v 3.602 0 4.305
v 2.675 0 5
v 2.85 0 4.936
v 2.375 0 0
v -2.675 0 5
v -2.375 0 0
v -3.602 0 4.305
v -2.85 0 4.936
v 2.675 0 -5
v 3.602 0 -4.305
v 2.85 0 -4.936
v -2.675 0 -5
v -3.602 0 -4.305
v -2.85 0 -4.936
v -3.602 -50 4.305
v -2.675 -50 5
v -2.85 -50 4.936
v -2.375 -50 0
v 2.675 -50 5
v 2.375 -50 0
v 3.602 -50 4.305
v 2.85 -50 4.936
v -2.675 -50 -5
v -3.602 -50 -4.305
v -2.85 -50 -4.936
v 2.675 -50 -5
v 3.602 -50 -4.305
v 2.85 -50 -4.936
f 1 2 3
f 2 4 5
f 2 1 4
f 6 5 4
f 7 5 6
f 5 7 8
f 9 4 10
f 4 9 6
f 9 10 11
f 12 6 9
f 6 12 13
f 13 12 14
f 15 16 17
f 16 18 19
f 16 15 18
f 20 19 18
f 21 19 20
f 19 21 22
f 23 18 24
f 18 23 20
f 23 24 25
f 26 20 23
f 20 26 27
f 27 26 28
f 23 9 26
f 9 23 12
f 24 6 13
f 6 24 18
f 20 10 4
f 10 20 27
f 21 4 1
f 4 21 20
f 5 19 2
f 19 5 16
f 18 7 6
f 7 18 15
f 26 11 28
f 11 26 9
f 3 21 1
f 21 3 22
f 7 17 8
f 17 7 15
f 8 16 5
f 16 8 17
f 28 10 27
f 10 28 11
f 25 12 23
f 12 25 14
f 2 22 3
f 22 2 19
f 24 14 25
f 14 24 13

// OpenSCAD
// file: ../../globals.scad
/*
Most things in this file is represented as one millimeter, so keep that in mind while changing things.
Some of the setting are not mm but at variables that you can set, such as 2*x=2x and you are setting what x is.
I will try to specify when things are variables and not exact measurements.
*/

//Virindi settings
dovetail_male_width_scale = 0.98;
dovetail_male_height_scale = 0.91;

obj_leg = 30;
leg_length = 5.5;
small_number = 0.001;
metal_core_rode_global = 5;


///////////////// number of holes /////////////////////
z_hole_number = 8;
other_holes = 8;

///////////////// Pins /////////////////////

//pins that poke out
ball_size = 10;
pin_height = 20;
pin_diameter = 6;


//holes
hole_ball_size = ball_size;
hole_pin_height = pin_height;
hole_pin_diameter = pin_diameter;

///////////////// Z THINGS /////////////////////

berring_slot_width = 7.5;
berring_slot_depth = 6.5;
metal_core_rode = 5;

///////////////// X THINGS /////////////////////

//male dove tails
max_width=8;
min_width=5;
depth=5;
height=obj_leg/2;

//female dove tails, this is found on the y mounts
girl_max_width=11;
girl_min_width=5;
girl_depth=5;
girl_height=obj_leg;


///////////////// Y THINGS /////////////////////
/*
The Y is so normal that all of those global variables at the top should change all of the setting in it, this section is set her incase there are variables set in the future development of this project.
*/
// file: ../../include.scad
//////////////////      END SECTION       //////////////////

	module added_pins(){
		difference(){
			union(){
				translate([30/(15/4),obj_leg*leg_length,30/(15/4)]) pin();
				translate([30/(15/4)+14.5,obj_leg*leg_length,30/(15/4)+14]) pin();
			}
			union(){
							translate([30/(15/4)+13.5,obj_leg*leg_length-20,30/(15/4)+5])cube(size=[2,40,15]);
							translate([30/(15/4)+7.5,obj_leg*leg_length-20,30/(15/4)+15])rotate([0,90,0]) cube(size=[2,40,15]);	

							translate([30/(15/4)-1,obj_leg*leg_length-20,30/(15/4)-8])cube(size=[2,40,15]);
							translate([30/(15/4)-10,obj_leg*leg_length-20,30/(15/4)+1])rotate([0,90,0]) cube(size=[2,40,15]);
			}
		}
	}
	module taken_pins() {
		translate([30/(15/4)+14,obj_leg*leg_length-10,30/(15/4)]) mirror_pin();
		translate([30/(15/4),obj_leg*leg_length-10,30/(15/4)+15]) mirror_pin();
	}


//////////////////      OTHER STUFF       //////////////////

	module holes() {
		rotate([0,0,90]) for(y=[0:other_holes])
		translate([obj_leg+y*15,-15.5,7.5]) union() {
			translate([7.5,0,15]) hole_up();
			hole_down();
		}
	}
	module extend_holes() {
	module top(){
		rotate([0,0,90]) for(y=[0:other_holes+1])
		translate([(30/4)+y*15,-15.5,7.5]) union() {
			translate([7.5,0,15]) hole_up();
		}
	}
	module bottom(){
		rotate([0,0,90]) for(y=[0:other_holes+2])
		translate([(30/4)+y*15,-15.5,7.5]) union() {
			hole_down();
		
}
	}
	union(){
		top();
		bottom();
	}
	}

	module hole() {
		union() {
			rotate([90, 90, 0]) cylinder(h=40, d=hole_pin_diameter, center=true);
			translate([0,7.5,0]) sphere(d=hole_ball_size);
			translate([0,-6,0]) sphere(d=hole_ball_size);
		}
	}
	module hole_up() {
		union() {
			rotate([90, 90, 0]) cylinder(h=40, d=hole_pin_diameter, center=true);
			translate([0,7.5,10]) cylinder(h=hole_pin_height, d=hole_pin_diameter, center=true);
			translate([0,-6,10]) cylinder(h=hole_pin_height, d=hole_pin_diameter, center=true);
			translate([0,7.5,0]) sphere(d=hole_ball_size);
			translate([0,-6,0]) sphere(d=hole_ball_size);
		}
	}
	module hole_down() {
		union() {
			rotate([90, 90, 0]) cylinder(h=40, d=hole_pin_diameter, center=true);
			translate([0,7.5,-10]) cylinder(h=hole_pin_height, d=hole_pin_diameter, center=true);
			translate([0,-6,-10]) cylinder(h=hole_pin_height, d=hole_pin_diameter, center=true);
			translate([0,7.5,0]) sphere(d=hole_ball_size);
			translate([0,-6,0]) sphere(d=hole_ball_size);
		}
	}
	module pin() {
		union() {
			rotate([90, 90, 0]) cylinder(h=pin_height, d=pin_diameter, center=true);
			translate([0,7.5,0]) sphere(d=ball_size);
		}
	}

	module mirror_pin() {
		rotate([90, 90, 0]) cylinder(h=hole_pin_height+small_number, d=hole_pin_diameter, center=true);
		translate([0,-(pin_height-(ball_size/2)),0]) sphere(d=ball_size);
	}


//////////////////      SOME RACK AND Z THINGS       //////////////////

module z_holes() {
    rotate([0,-90,0]) for(z=[0:z_hole_number])
    translate([22.5+z*15,16,-12])
        hole();
}

module pin_cuts() {
	union(){
		cube(size=[2,10,40], center=true);
		rotate([0,0,90]) cube(size=[2,10,40], center=true);
	}
}
module pin_uncut() {
	union(){
		rotate([0, 0, 90]) cylinder(h=hole_pin_height, d=hole_pin_diameter, center=true);
		translate([0,0,10]) sphere(d=ball_hole);
	}
}


module pin_out() {
	union(){
		rotate([0, 0, 90]) cylinder(h=pin_height, d=pin_diameter, center=true);
		translate([0,0,10]) sphere(d= ball_size);
	}
}


module pins_z(){
	difference() {
		pin_out();
		pin_cuts();
	}
}
//////////////////      RACK AND SLIDE     ///////////////////

module straight_pins() {
	for(z=[0:((((obj_leg*leg_length)*2)-(obj_leg*2))/3)/14.5]) rotate([-90,0,0]) translate([z*15,30/(15/4),14]) pins_z();
	for(z=[0:((((obj_leg*leg_length)*2)-(obj_leg*2))/3)/14.5]) rotate([-90,0,0]) translate([z*15,30/(15/4)-14,14]) pins_z();
}
module stagger_pins() {
	for(z=[0:((((obj_leg*leg_length)*2)-(obj_leg*2))/3)/14.5]) rotate([-90,0,0]) translate([z*15,30/(15/4),14]) pins_z();
	for(z=[0:((((obj_leg*leg_length)*2)-(obj_leg*2))/3)/14.5]) rotate([-90,0,0]) translate([z*15+7,30/(15/4)-14,14]) pins_z();
}


//////////////////      DOVE TAIL       //////////////////

module male_dovetail(height) {
	dovetail_3d(max_width,min_width,depth,height);
}

module dovetail_3d(max_width=11, min_width=5, depth=5, height=30) {
	linear_extrude(height=height, convexity=2)
		dovetail_2d(max_width,min_width,depth);
}

module dovetail_2d(max_width=11, min_width=5, depth=5) {
	angle=atan((max_width/2-min_width/2)/depth);
	echo("angle: ", angle);
	polygon(paths=[[0,1,2,3,0]], points=[[-min_width/2,0], [-max_width/2,depth], [max_width/2, depth], [min_width/2,0]]);
}

//bow tie
	module tie_end(height){
				rotate([0,0,0]) translate([0,-0.01,((obj_leg/2)/2)]) male_dovetail(height);
				rotate([0,90,0]) translate([0,-0.01,((obj_leg/2)/2)]) male_dovetail(height);
				rotate([0,180,0]) translate([0,-0.01,((obj_leg/2)/2)]) male_dovetail(height);
				rotate([0,-90,0]) translate([0,-0.01,((obj_leg/2)/2)]) male_dovetail(height);
	}

module bow_support(){
	difference(){
		intersection(){
			translate([-15,0,-15]) cube([30,9,30]);
			scale([1.05,1.05,1.05]) rotate([0,45,0]) tie_end();
		}
		cube([29.2,29.2,29.2], center=true);
	}
}

	module wrap(units){
	for (y = [-1:units-2]) // two iterations, z = -1, z = 1
	{
			translate([15, (y*30)+15, 15]){
			for (r = [0:4]) // two iterations, z = -1, z = 1
			{
				rotate([0,r*90,0]) translate([0,15,15]) rotate([-90,0,0])male_dovetail(height=30);
			}
		}
	}
	}
// main file
length = 50;
tilt_level = 1.1;
scaling_x = .95;
scaling_y = 1;
scaling_z = 1;
include <../../include.scad>;
include <../../globals.scad>;

obj_leg= 12;
module bow_tie_master(){
	union(){
		mirror([0,1,0]){
			male_dovetail(height=length);
		}
			male_dovetail(height=length);		
	}
}

intersection(){
    scale([scaling_x,scaling_y,scaling_z])	rotate([90,0,0]) bow_tie_master();
    rotate([90,0,0]) cylinder(r=5.7, h=200);
}
